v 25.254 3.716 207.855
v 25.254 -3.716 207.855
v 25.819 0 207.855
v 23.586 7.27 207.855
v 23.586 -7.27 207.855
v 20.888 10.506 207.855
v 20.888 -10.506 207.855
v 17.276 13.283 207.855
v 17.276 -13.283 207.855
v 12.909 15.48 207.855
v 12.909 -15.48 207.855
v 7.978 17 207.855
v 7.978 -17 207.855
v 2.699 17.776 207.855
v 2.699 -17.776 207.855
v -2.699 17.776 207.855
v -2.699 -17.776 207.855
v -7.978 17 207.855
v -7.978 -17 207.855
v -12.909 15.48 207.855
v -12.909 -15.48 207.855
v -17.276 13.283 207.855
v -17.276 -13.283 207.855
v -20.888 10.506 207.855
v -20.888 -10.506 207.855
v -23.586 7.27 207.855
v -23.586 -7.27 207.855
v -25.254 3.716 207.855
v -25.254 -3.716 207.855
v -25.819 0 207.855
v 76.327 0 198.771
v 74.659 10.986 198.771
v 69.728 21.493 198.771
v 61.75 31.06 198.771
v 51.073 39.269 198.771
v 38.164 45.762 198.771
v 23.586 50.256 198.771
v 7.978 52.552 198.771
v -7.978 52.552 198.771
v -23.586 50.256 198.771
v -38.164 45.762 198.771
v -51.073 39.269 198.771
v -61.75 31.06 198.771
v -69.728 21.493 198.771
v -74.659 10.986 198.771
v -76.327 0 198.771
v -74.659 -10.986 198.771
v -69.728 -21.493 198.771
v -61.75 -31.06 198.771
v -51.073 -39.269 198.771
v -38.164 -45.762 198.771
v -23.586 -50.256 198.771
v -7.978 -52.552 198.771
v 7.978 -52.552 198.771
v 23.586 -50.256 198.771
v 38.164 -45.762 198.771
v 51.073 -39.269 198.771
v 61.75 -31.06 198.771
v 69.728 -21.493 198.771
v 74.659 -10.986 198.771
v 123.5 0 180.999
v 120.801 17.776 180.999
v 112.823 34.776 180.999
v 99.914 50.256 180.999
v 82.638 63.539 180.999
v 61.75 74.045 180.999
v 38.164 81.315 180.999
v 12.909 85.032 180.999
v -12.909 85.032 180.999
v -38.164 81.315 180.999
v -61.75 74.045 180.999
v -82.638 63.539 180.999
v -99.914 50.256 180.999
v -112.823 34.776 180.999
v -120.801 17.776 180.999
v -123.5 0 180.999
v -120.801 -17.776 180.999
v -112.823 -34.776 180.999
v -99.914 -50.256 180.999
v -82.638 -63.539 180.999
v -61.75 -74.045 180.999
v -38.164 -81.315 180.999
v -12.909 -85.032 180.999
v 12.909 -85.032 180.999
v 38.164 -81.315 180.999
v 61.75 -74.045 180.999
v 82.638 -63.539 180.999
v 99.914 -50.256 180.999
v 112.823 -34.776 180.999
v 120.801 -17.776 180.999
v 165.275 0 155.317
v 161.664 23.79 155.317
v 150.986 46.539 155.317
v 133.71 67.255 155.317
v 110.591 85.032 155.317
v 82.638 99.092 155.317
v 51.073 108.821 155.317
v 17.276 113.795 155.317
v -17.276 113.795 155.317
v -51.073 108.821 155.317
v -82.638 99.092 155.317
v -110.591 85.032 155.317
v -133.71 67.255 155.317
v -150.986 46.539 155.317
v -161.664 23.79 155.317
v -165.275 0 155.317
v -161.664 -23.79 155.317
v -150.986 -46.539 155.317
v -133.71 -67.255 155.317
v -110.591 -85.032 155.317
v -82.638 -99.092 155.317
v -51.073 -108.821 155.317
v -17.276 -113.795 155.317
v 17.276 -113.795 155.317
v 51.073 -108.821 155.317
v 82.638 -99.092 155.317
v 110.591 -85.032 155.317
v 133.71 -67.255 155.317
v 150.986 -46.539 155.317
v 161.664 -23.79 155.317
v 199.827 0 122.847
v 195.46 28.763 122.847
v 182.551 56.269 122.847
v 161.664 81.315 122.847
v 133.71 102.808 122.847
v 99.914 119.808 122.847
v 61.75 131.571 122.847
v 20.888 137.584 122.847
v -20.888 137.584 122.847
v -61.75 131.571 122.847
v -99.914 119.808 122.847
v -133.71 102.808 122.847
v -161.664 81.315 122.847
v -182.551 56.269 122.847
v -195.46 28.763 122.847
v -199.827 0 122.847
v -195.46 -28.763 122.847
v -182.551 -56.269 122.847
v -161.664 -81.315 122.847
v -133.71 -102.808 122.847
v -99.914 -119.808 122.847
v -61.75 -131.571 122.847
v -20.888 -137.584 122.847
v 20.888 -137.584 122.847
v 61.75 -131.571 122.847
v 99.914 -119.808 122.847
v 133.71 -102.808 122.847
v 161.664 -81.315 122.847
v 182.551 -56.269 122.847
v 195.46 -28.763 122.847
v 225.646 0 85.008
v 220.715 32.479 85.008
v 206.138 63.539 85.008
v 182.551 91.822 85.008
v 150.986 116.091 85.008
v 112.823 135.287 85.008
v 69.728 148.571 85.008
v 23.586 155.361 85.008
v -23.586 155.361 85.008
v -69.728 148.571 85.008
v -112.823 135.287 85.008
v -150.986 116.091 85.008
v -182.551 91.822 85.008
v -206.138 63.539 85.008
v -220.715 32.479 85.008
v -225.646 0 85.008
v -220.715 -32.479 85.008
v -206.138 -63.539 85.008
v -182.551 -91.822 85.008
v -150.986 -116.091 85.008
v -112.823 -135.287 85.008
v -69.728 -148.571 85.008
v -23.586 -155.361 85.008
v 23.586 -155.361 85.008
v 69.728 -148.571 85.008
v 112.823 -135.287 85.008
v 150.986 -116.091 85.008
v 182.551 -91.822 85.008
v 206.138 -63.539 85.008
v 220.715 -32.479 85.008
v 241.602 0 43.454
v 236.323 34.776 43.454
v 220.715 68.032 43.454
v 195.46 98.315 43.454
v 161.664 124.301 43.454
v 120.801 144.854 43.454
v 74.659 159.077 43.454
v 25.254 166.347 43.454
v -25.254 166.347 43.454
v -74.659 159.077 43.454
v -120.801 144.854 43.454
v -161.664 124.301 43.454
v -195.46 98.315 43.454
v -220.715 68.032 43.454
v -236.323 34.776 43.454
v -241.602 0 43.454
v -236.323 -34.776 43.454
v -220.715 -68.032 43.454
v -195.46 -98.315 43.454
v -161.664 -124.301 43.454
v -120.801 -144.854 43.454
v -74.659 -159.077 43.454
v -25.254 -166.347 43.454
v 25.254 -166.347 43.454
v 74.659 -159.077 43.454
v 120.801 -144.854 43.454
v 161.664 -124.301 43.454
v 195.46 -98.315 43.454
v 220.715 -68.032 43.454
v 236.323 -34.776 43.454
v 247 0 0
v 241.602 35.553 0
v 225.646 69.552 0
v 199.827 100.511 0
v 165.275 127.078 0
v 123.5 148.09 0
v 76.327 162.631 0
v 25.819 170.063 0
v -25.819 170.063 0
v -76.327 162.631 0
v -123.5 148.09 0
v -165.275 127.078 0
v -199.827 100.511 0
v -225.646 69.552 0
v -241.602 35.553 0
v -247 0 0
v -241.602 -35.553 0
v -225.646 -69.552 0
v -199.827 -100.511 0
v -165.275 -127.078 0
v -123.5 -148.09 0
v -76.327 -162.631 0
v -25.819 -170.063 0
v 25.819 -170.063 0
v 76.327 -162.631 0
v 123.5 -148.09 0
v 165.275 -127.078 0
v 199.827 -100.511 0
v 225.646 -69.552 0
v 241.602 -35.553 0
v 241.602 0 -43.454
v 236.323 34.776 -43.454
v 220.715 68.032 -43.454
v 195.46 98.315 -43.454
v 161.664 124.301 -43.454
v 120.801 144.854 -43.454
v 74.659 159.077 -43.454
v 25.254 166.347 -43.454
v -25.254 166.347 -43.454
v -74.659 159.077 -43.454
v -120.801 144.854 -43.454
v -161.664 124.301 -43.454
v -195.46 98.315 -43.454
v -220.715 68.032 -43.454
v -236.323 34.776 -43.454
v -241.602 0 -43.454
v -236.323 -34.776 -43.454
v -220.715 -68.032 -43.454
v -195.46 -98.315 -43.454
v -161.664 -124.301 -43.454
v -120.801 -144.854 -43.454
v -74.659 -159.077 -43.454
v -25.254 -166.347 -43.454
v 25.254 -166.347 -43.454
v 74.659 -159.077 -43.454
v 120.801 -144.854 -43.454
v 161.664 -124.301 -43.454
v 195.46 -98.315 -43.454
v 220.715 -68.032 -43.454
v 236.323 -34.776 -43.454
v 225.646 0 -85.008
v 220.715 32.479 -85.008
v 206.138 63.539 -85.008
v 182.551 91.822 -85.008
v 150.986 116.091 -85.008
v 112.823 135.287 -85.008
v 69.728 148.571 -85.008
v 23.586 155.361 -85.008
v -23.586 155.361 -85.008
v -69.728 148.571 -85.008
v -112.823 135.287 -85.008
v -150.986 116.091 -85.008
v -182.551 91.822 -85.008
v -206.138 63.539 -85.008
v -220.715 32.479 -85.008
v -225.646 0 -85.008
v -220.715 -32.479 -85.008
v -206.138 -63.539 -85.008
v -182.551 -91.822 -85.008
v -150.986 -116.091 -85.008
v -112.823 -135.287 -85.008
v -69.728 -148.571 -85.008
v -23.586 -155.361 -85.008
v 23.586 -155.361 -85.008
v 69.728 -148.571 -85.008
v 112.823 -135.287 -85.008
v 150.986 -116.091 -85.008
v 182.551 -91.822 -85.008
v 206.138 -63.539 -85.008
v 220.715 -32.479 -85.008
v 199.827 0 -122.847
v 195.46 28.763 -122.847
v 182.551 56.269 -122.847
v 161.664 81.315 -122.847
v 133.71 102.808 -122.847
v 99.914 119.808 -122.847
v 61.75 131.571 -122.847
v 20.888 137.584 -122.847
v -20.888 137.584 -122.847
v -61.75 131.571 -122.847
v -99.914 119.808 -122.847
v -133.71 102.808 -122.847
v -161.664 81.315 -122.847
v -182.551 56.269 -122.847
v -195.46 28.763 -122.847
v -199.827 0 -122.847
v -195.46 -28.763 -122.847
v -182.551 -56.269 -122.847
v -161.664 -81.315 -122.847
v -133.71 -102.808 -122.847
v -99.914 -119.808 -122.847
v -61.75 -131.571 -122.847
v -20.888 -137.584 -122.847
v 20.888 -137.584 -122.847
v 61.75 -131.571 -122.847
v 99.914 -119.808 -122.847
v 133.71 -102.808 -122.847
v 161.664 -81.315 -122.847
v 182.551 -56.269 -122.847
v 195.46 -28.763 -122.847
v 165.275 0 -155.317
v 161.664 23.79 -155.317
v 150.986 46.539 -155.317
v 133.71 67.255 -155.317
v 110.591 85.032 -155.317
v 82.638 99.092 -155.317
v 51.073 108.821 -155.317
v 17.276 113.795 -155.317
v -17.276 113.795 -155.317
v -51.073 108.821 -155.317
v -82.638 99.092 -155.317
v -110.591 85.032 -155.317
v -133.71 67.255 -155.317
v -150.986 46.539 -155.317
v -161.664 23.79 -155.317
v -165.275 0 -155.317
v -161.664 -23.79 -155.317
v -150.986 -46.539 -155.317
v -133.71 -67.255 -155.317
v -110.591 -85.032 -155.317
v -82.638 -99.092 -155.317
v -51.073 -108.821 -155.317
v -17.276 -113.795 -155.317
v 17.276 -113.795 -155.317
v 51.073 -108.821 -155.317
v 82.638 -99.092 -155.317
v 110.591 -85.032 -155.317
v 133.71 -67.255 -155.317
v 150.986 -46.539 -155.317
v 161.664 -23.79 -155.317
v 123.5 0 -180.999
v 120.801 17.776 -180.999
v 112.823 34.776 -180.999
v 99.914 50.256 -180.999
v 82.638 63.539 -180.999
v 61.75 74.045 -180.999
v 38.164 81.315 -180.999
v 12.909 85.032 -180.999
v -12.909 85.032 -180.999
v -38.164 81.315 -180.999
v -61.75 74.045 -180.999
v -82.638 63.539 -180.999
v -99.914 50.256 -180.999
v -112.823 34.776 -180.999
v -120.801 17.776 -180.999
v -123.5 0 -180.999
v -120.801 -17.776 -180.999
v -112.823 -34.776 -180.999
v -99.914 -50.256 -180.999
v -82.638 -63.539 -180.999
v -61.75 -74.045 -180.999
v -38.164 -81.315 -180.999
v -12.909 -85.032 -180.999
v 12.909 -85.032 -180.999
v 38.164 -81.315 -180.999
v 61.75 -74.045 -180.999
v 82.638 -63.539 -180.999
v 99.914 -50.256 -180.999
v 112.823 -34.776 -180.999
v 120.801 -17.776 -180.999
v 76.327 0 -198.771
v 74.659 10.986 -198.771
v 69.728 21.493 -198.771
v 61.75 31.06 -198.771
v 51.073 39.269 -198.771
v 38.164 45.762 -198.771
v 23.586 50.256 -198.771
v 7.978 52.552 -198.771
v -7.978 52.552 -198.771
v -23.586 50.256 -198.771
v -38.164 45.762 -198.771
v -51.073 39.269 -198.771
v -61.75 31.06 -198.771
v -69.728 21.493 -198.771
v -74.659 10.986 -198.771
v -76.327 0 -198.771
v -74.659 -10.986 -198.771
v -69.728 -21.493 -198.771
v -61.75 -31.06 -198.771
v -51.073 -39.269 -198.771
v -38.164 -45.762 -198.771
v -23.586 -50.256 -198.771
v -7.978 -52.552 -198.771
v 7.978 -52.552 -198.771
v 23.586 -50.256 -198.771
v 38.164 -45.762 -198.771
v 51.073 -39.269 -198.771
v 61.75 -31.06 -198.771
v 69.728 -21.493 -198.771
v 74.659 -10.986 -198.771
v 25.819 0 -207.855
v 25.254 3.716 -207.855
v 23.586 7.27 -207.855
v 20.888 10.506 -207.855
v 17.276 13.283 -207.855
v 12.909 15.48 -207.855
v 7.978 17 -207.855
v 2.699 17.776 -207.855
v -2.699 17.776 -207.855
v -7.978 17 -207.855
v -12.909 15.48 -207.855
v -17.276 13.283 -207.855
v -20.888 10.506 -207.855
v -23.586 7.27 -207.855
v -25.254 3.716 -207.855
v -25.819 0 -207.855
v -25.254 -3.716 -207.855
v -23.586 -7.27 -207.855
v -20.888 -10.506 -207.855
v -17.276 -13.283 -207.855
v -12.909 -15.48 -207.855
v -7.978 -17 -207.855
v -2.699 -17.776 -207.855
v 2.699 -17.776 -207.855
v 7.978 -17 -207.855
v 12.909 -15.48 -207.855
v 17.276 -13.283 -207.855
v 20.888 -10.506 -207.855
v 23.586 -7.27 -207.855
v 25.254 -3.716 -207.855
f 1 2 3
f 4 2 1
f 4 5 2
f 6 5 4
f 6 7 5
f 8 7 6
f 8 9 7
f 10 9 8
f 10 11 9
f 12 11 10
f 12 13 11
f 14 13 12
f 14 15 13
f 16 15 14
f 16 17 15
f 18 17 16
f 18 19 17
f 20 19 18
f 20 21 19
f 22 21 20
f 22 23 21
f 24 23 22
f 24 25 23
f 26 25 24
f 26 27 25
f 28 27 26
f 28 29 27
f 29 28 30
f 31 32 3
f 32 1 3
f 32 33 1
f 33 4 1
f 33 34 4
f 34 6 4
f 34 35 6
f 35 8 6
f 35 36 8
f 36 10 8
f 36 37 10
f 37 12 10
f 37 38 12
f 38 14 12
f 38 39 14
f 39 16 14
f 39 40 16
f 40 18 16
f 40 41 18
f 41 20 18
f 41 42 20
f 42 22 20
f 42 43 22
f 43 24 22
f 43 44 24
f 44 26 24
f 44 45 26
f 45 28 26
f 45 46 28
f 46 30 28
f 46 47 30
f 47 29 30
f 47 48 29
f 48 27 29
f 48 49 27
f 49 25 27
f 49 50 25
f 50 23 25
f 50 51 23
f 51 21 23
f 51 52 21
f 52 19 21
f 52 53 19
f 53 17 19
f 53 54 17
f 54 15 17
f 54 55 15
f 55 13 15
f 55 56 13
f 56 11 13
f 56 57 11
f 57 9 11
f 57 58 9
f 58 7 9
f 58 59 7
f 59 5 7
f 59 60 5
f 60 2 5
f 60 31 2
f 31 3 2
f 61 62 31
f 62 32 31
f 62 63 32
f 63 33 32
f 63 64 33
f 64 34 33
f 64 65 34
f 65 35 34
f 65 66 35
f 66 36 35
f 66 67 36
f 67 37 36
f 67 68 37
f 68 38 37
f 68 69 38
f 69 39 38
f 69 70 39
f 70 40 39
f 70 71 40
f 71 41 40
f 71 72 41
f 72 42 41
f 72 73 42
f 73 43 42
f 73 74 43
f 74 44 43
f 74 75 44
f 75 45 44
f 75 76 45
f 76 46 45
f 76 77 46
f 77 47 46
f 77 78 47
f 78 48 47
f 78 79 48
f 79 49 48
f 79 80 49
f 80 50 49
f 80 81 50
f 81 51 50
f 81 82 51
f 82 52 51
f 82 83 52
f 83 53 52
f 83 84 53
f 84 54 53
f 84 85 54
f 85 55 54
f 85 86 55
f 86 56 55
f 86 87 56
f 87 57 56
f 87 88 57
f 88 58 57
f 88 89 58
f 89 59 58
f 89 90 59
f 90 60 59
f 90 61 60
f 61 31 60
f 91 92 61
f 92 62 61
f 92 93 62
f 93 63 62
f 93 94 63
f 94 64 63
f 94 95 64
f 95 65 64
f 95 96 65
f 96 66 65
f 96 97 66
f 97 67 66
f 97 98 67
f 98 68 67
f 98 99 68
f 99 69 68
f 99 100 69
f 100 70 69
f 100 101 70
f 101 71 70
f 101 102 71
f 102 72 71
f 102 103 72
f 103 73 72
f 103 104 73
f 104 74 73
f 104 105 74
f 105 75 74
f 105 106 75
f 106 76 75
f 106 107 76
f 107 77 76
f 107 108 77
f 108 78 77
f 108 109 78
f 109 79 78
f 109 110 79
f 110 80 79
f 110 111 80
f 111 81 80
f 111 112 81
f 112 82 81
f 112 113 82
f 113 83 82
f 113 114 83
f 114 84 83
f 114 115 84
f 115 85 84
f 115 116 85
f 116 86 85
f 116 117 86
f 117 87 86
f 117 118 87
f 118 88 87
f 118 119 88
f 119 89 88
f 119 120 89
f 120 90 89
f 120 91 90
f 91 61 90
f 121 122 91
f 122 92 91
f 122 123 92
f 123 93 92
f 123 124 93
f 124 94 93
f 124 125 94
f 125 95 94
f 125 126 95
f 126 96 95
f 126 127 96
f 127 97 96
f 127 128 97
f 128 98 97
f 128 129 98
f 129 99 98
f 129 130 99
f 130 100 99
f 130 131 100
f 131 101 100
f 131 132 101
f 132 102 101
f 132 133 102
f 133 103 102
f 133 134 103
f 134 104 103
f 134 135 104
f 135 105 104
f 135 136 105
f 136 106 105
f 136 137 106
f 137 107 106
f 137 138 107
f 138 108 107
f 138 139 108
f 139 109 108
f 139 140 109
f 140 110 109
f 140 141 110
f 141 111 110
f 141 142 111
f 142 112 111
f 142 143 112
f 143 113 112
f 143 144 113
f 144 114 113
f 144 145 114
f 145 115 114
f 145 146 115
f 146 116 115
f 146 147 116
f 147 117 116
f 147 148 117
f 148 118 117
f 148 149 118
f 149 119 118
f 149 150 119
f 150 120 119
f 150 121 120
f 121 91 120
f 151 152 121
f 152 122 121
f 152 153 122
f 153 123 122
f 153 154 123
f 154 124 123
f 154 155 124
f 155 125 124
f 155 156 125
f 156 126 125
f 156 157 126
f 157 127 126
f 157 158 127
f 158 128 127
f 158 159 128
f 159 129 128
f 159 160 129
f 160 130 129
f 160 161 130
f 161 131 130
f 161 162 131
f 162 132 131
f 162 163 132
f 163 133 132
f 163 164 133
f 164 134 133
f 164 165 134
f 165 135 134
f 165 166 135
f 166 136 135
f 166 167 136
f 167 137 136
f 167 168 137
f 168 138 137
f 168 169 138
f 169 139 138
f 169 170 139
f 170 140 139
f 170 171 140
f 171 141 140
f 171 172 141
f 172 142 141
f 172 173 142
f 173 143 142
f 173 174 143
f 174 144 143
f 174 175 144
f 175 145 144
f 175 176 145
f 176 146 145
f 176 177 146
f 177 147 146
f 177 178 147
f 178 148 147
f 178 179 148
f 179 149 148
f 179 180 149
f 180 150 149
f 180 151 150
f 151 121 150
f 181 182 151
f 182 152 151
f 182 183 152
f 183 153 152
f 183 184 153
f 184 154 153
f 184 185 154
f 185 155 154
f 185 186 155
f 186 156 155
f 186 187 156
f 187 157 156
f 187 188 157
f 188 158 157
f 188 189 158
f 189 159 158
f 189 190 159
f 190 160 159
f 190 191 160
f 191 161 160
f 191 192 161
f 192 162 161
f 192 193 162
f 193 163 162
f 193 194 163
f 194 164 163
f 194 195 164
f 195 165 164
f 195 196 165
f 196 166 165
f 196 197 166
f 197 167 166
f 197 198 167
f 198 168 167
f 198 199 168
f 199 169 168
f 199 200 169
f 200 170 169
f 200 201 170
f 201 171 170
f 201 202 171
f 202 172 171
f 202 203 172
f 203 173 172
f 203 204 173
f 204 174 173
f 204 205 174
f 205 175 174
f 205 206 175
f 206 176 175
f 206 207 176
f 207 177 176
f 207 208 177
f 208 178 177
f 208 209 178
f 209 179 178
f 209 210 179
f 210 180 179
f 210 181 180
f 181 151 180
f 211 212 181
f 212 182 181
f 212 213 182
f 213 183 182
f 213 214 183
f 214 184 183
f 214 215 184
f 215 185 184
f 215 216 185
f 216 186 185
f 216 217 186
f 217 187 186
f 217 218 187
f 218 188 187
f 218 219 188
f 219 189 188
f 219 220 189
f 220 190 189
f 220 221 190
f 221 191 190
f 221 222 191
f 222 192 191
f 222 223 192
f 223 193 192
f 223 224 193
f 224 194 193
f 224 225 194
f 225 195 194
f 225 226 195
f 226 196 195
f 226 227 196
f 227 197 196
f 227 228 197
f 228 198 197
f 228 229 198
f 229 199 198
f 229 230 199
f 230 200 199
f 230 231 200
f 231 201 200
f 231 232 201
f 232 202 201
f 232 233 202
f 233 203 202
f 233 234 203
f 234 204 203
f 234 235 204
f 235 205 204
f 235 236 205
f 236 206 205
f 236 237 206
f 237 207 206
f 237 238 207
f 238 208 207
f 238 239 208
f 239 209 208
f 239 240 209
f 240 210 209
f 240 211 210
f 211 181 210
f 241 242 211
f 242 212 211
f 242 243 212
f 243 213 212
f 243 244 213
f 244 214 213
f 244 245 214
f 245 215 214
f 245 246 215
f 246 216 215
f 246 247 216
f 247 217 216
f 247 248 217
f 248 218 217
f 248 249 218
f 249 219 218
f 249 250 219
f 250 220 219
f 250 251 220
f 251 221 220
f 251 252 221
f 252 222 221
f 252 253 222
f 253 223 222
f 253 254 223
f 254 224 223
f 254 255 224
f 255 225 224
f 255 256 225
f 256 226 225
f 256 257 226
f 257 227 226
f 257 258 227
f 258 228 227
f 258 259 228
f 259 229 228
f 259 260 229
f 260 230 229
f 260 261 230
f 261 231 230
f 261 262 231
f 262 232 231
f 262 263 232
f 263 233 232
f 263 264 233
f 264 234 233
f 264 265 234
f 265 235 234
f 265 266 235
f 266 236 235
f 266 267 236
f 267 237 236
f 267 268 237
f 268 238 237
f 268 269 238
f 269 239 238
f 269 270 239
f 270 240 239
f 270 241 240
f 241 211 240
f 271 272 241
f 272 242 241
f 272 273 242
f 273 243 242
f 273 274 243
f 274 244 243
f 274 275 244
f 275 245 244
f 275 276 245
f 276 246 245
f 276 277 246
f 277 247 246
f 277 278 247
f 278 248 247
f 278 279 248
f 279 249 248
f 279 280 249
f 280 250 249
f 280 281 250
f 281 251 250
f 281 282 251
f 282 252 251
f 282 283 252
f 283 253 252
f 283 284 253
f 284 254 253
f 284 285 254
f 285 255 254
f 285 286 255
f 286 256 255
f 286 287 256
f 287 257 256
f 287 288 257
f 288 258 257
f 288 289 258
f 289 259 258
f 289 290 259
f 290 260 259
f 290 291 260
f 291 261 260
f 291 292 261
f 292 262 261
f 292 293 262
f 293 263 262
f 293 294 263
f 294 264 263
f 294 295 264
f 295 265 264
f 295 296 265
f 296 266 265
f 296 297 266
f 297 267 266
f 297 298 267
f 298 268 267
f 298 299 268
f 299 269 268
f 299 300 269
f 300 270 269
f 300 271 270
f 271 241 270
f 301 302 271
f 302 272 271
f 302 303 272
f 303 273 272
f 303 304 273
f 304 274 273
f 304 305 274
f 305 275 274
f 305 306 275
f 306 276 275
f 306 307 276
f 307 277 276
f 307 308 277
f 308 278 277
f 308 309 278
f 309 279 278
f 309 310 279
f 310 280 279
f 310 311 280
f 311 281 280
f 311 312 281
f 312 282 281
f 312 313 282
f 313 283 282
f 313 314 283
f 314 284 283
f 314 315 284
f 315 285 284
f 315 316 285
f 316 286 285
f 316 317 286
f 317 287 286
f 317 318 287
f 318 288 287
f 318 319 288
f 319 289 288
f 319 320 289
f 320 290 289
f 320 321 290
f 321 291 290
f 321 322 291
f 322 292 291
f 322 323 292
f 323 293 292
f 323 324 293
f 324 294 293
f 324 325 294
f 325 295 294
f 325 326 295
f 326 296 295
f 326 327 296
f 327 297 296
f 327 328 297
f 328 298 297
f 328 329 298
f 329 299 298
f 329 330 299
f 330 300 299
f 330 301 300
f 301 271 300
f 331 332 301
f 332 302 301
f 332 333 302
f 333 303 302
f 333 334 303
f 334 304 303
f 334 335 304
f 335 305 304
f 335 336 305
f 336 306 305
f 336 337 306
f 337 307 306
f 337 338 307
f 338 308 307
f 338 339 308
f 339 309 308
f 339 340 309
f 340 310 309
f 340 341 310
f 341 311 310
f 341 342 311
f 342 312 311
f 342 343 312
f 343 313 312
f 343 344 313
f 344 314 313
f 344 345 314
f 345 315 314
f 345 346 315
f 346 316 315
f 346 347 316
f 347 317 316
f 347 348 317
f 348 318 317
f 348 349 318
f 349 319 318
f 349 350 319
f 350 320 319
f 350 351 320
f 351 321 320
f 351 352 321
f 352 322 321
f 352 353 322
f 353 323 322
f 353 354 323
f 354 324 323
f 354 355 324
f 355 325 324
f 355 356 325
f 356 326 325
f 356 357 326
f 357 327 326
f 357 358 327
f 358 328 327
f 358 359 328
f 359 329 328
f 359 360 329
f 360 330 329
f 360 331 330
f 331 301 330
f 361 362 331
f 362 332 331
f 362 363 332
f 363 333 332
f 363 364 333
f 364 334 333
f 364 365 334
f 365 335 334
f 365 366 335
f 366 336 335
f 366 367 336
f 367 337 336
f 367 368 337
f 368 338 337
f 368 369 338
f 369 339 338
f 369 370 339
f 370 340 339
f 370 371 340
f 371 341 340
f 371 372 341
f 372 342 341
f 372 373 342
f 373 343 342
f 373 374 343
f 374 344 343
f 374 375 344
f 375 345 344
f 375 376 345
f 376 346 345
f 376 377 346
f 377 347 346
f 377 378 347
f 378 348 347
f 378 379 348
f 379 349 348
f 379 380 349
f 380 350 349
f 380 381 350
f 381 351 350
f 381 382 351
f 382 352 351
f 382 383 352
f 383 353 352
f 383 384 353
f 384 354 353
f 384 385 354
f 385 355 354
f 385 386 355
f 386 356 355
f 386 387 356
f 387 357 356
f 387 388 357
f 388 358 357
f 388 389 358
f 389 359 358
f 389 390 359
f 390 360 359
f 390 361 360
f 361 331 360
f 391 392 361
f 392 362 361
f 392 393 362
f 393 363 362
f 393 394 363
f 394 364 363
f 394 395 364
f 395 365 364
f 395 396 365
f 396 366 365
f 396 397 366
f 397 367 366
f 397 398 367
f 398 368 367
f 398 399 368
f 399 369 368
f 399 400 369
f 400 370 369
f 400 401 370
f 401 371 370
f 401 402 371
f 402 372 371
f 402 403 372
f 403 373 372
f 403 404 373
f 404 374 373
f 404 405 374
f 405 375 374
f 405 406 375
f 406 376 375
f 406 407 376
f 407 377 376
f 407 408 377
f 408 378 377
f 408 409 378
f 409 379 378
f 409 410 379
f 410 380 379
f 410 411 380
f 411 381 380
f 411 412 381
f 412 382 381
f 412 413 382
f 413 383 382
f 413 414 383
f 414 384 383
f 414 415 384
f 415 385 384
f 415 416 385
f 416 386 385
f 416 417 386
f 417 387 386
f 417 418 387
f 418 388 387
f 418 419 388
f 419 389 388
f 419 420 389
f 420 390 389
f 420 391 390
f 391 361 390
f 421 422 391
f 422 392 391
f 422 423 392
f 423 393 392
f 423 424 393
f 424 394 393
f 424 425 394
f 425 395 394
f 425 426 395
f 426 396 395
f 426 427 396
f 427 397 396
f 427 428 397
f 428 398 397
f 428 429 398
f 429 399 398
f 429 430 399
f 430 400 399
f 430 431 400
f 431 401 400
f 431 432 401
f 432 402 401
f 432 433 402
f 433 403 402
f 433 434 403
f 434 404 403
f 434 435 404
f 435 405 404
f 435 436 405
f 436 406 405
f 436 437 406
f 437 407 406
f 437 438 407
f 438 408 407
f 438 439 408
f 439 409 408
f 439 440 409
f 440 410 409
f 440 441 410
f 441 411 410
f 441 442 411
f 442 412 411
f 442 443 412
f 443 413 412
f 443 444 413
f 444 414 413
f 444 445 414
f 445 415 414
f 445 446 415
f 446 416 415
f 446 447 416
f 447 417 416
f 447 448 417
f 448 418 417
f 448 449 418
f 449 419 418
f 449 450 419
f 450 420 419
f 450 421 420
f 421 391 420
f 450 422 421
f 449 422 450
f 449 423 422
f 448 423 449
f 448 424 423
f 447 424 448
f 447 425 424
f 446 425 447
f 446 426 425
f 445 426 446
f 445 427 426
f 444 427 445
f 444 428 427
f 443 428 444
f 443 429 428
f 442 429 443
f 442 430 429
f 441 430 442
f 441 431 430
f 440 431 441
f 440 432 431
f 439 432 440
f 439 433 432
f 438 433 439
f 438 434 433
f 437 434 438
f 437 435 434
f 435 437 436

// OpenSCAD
// Generated by SolidPython 1.0.1 on 2020-07-29 00:46:50


scale(v = [13, 9, 11]) {
	sphere(r = 19);
}
/***********************************************
*********      SolidPython code:      **********
************************************************
 
# import packages: SolidPython
from solid import *
from solid.utils import *
from itertools import chain, combinations, permutations


class Resize:

    def __init__(self, scad_file):
        self.scad_file = scad_file
        #self.scad_file = import_scad(scad_file)
        # cone/cylinder param:
        self.r1 = 0
        self.r2 = 0
        self.h = 0
        # rectangular prism param:
        self.w = 0
        self.l = 0
        # ellipse param:
        self.r = 0

    # import OpenScad code (file name corresponds to shape)


    # classify shape + parameters
    def assign(self, param1, param2, param3):
        if self.scad_file == 'cone.scad':
            self.r1 = param1
            self.r2 = param2
            self.h = param3
        elif self.scad_file == 'cylinder.scad':
            self.r1 = param1
            self.r2 = param2
            self.h = param3
        elif self.scad_file == 'rectangularPrism.scad':
            self.h = param1
            self.l = param2
            self.w = param3
        else:
            self.r = param1
            self.h = param2

    # resize parameters
    def iterate(self):
        x = range(3, 20, 2)
        i = 1
        if self.scad_file == 'cone.scad':
            tempList = list(permutations(x, 2))
            for temp in tempList:
                param1 = temp[0]
                param2 = temp[1]
                filepath = 'produced_scad_files/' + 'cone' + str(param1) + '_' + str(param2) + '_' + '.scad'
                scad_render_to_file(cylinder(h=param1, r1=param2, r2=0), filepath)

        elif self.scad_file == 'cylinder.scad':
            tempList = list(permutations(x, 3))
            for temp in tempList:
                param1 = temp[0]
                param2 = temp[1]
                filepath = 'produced_scad_files/' + 'cylinder' + str(param1) + '_' + str(param2) + '_' + '.scad'
                scad_render_to_file(cylinder(h=param1, r1=param2, r2=param2), filepath)

        elif self.scad_file == 'rectangularPrism.scad':
            tempList = list(permutations(x, 3))
            for temp in tempList:
                param1 = temp[0]
                param2 = temp[1]
                param3 = temp[2]
                filepath = 'produced_scad_files/' + 'rectangularPrism' + str(param1) + '_' + str(param2) + '_' + str(
                    param3) + '.scad'
                scad_render_to_file(cube(size=(param1, param2, param3)), filepath)

        elif self.scad_file == 'ellipse.scad':
            tempList = list(permutations(x, 4))
            for temp in tempList:
                param1 = temp[0]
                param2 = temp[1]
                param3 = temp[2]
                param4 = temp[3]
                filepath = 'produced_scad_files/' + 'ellipse' + str(param1) + '_' + str(param2) + '_' + str(param3) + '_' + str(param4) + '.scad'
                scad_render_to_file(scale([param1, param2, param3])(sphere(r=param4)), filepath)

    def render_to_scadfile(self):
        scad_render_to_file(scad, 'example.scad') 
 
************************************************/
